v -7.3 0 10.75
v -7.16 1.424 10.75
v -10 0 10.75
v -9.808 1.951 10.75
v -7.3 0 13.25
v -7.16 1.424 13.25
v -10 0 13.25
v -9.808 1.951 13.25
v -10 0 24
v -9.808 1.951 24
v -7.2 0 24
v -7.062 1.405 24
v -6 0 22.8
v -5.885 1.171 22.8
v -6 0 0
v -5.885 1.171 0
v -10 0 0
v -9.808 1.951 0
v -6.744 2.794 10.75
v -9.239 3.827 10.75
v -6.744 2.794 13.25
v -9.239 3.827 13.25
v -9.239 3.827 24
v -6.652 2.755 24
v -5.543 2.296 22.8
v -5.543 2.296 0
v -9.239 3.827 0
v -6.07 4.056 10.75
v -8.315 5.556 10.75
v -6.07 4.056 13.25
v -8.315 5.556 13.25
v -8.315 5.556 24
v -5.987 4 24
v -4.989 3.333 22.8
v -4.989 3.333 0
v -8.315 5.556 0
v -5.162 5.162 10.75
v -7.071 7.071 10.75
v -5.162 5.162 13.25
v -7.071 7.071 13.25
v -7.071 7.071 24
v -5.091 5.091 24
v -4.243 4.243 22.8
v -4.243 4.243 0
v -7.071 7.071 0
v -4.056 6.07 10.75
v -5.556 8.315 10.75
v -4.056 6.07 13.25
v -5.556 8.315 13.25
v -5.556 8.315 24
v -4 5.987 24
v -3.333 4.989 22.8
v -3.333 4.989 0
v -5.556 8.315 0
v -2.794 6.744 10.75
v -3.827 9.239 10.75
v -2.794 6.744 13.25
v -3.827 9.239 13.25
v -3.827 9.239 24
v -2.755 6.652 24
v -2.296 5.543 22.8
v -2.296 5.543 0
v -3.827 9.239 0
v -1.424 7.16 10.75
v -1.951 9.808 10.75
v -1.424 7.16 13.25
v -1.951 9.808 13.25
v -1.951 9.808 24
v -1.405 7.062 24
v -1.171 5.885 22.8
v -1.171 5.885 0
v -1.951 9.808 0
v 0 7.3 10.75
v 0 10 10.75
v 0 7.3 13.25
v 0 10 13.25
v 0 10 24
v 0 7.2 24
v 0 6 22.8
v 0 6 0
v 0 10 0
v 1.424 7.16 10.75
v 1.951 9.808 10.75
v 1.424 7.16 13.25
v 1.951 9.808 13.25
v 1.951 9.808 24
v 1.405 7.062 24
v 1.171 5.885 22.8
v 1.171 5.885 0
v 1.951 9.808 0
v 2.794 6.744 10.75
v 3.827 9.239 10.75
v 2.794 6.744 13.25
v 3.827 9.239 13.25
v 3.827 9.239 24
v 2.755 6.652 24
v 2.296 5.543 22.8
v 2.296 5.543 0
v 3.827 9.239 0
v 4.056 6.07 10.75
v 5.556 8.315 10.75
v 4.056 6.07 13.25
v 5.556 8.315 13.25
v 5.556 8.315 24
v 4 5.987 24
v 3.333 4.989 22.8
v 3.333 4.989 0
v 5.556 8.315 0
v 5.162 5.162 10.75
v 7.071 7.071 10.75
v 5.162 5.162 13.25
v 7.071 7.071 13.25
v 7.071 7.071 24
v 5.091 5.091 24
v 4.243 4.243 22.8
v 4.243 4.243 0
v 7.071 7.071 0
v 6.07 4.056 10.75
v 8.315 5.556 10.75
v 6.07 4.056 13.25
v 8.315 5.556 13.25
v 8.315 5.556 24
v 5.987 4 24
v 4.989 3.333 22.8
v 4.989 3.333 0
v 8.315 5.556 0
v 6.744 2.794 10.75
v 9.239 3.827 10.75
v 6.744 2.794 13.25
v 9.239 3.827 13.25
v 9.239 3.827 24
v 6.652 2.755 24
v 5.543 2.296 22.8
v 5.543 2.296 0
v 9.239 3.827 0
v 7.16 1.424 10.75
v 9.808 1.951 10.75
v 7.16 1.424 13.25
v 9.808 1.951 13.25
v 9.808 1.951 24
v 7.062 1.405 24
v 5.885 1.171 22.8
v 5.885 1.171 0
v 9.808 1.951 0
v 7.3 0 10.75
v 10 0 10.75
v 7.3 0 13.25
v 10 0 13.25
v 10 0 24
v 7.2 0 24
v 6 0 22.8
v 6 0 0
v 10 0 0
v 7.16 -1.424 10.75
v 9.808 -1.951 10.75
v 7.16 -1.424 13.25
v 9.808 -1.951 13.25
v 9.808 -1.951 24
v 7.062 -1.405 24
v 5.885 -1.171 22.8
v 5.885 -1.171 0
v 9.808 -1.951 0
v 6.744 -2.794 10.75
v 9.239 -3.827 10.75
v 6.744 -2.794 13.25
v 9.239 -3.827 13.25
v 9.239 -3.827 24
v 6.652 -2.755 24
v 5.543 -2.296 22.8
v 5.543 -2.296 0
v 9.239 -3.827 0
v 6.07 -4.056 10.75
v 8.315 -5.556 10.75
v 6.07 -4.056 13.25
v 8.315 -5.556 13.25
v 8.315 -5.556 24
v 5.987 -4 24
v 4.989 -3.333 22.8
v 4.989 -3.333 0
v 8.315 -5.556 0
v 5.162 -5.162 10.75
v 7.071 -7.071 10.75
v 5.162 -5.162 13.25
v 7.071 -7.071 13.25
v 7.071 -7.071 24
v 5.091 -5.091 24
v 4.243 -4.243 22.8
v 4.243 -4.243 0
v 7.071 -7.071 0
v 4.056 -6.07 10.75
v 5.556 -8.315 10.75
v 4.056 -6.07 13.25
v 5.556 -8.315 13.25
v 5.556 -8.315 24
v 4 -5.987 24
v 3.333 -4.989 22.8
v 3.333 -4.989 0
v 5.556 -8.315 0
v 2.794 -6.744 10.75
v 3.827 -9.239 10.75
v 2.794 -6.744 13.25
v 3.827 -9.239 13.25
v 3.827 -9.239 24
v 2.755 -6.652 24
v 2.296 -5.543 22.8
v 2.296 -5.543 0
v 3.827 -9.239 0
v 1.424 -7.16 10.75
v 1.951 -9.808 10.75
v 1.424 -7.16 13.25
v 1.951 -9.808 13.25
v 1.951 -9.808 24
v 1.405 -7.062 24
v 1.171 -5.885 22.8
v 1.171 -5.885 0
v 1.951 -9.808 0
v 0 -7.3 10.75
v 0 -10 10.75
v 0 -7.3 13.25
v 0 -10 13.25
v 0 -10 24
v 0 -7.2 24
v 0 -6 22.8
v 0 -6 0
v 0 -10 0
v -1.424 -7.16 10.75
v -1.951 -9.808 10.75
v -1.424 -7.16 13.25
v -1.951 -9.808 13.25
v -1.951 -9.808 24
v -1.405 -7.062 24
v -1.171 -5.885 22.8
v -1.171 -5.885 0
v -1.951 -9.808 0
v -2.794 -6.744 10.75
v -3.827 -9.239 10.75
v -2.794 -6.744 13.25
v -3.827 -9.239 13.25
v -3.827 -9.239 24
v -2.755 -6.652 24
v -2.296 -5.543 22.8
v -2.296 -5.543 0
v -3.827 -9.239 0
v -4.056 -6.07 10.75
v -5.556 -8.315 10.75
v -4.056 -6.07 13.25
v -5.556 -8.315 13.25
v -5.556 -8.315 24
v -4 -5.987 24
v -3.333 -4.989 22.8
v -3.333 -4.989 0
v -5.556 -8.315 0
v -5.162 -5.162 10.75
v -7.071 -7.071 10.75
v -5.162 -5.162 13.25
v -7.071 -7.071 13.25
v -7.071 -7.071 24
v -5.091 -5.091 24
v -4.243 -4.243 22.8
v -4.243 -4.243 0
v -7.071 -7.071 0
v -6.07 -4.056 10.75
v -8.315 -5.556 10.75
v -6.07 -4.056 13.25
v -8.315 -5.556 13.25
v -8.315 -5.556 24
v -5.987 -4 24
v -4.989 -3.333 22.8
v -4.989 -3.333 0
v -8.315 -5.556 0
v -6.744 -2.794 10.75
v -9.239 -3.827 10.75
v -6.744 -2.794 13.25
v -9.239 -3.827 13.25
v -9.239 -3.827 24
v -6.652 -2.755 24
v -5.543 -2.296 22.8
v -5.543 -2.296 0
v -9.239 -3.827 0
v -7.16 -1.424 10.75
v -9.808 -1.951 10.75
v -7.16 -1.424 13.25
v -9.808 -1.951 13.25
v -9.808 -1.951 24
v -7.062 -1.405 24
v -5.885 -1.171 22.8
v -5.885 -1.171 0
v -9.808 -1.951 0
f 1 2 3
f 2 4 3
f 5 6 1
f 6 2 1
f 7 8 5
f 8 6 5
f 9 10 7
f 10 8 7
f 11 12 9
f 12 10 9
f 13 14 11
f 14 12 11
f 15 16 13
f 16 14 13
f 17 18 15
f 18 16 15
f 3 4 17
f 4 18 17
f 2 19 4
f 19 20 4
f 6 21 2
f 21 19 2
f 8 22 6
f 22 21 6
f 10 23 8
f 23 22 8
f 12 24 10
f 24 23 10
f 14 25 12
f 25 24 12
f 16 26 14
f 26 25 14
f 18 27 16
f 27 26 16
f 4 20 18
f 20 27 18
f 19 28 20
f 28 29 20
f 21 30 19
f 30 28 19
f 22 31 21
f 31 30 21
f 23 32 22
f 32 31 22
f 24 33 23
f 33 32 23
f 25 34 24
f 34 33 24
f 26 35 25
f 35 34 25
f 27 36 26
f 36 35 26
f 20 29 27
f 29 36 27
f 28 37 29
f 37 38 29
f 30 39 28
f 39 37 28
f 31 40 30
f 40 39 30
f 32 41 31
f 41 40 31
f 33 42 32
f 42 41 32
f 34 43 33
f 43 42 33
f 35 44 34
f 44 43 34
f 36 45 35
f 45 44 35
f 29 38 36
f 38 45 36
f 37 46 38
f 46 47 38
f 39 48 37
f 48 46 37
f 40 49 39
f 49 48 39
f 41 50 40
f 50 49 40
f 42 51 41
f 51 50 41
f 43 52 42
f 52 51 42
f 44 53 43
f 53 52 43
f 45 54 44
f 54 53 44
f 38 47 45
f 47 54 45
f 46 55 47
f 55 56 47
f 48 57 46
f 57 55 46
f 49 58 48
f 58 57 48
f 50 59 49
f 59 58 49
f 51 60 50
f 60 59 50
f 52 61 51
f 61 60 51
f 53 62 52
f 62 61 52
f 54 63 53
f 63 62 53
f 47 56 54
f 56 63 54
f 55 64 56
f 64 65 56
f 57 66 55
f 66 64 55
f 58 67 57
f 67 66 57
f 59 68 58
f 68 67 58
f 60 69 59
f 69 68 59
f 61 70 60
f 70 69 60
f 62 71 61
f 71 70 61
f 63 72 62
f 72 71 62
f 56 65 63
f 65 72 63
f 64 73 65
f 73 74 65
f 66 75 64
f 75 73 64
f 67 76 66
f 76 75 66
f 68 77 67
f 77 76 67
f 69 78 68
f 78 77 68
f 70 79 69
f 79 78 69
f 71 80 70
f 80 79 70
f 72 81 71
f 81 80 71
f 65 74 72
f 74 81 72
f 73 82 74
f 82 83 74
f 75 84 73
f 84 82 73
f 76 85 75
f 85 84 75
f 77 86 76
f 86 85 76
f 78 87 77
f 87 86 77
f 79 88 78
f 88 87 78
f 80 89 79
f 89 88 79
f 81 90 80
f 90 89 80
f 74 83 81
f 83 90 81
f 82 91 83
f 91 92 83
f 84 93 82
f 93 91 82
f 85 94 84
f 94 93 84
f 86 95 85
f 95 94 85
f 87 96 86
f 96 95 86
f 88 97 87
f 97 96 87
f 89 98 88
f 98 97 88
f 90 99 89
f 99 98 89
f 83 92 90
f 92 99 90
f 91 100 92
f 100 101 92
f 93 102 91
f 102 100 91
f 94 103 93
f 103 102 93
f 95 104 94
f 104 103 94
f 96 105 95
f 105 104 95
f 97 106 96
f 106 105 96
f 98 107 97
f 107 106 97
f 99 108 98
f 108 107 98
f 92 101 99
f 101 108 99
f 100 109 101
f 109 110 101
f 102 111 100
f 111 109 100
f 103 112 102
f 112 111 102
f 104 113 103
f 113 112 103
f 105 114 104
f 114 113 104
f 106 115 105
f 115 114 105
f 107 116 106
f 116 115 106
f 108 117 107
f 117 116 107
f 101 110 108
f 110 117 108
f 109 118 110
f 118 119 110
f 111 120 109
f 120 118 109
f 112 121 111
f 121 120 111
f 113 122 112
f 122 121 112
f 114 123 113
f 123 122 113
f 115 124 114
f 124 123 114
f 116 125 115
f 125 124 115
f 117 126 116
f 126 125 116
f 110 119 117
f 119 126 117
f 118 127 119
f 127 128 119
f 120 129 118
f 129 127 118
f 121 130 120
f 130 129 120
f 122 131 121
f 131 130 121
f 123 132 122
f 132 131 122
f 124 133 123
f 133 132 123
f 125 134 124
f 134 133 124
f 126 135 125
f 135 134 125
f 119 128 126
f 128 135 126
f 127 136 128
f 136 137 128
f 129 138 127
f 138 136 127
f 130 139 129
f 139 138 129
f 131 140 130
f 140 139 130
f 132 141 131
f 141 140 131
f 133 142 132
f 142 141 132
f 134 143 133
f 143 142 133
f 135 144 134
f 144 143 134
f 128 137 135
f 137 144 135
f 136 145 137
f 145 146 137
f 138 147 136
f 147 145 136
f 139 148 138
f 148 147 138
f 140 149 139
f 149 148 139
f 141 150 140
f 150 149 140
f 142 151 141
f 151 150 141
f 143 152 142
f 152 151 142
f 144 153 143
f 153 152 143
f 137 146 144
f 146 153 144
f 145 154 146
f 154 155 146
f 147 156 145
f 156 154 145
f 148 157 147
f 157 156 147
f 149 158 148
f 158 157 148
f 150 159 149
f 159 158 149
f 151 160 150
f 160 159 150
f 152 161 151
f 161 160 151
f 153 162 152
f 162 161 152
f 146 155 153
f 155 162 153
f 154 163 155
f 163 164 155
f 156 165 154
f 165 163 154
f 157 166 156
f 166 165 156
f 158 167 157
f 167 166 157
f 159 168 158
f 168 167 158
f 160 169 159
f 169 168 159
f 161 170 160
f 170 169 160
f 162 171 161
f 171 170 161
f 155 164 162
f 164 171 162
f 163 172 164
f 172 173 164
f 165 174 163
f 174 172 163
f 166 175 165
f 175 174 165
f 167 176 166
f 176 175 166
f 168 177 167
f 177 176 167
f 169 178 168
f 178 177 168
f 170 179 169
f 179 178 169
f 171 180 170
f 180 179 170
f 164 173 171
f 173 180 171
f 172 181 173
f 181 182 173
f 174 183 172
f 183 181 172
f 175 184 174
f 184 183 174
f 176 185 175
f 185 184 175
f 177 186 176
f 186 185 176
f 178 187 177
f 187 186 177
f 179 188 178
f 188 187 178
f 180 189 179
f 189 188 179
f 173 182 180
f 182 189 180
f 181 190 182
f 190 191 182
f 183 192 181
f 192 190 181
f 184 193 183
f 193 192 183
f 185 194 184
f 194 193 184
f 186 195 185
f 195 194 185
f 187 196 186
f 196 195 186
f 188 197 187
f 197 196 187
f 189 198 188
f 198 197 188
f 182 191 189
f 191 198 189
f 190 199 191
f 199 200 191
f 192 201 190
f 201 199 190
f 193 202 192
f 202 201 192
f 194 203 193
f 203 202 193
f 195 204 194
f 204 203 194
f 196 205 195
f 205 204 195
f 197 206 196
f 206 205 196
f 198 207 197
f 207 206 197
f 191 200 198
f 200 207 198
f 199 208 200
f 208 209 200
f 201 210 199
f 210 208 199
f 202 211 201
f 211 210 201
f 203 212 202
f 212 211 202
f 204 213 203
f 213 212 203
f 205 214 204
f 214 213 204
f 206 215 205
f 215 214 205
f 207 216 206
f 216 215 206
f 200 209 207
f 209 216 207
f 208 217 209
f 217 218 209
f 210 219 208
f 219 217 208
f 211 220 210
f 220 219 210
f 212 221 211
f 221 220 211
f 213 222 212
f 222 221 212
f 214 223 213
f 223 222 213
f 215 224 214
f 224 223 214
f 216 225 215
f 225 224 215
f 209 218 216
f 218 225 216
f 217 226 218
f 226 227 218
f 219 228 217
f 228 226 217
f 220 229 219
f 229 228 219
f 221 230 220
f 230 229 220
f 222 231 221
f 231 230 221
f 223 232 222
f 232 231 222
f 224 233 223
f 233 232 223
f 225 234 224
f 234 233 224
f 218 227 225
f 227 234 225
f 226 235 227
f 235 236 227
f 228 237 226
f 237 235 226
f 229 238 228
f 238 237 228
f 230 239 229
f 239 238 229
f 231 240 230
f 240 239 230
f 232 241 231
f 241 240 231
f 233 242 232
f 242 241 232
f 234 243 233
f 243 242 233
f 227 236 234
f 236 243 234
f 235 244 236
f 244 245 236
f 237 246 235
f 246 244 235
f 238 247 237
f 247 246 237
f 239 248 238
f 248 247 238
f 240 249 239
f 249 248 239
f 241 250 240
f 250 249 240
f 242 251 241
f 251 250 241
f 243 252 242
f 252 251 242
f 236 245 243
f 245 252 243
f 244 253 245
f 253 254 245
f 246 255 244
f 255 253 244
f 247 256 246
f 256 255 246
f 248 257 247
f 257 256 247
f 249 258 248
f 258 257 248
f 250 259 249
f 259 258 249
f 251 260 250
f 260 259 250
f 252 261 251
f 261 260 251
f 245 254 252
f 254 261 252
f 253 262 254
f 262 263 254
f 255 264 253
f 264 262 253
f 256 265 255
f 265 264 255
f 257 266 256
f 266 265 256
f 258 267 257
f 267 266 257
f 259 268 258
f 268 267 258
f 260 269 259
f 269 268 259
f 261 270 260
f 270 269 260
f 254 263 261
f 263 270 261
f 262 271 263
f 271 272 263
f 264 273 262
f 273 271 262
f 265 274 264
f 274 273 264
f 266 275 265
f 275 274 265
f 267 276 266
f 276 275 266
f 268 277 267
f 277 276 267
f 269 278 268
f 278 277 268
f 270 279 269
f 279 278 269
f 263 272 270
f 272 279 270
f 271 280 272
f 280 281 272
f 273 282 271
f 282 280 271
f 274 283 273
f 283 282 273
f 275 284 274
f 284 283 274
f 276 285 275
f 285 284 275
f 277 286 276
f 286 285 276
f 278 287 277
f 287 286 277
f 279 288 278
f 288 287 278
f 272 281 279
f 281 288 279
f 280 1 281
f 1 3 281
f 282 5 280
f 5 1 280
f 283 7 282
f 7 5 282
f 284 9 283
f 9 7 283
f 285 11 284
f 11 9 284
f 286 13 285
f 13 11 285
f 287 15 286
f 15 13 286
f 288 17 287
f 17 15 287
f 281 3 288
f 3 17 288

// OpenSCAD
$fn = 32;

// ----------------------------------------------------------------------
// Grooved revolve: thread_relief, bore R6
// ----------------------------------------------------------------------

// --- parameters (mm) ---
bore_r = 6;               // bore radius
outer_r = 10;             // outer radius of the body
total_h = 24;             // overall height, Z
wall = 4;                 // radial wall thickness
groove_w = 2.5;           // groove width
groove_d = 2.7;           // groove depth
grooves = 1;              // number of outer grooves
relief = 1.2;             // thread relief leg at the bore mouth
relief_angle = 45;        // thread relief chamfer angle, degrees

bbox_x = 2 * outer_r;  // full diameter
bore_d = 2 * bore_r;  // bore diameter
body_d = 2 * outer_r;  // body diameter
revolve_angle = 360;  // full turn around the Z axis

profile = [[6, 0], [10, 0], [10, 10.75], [7.3, 10.75], [7.3, 13.25], [10, 13.25], [10, 24], [7.2, 24], [6, 22.8]];  // primary outline, 9 points, counter clockwise

// --- the one profile operation ---
rotate_extrude(angle = revolve_angle) polygon(points = profile);
